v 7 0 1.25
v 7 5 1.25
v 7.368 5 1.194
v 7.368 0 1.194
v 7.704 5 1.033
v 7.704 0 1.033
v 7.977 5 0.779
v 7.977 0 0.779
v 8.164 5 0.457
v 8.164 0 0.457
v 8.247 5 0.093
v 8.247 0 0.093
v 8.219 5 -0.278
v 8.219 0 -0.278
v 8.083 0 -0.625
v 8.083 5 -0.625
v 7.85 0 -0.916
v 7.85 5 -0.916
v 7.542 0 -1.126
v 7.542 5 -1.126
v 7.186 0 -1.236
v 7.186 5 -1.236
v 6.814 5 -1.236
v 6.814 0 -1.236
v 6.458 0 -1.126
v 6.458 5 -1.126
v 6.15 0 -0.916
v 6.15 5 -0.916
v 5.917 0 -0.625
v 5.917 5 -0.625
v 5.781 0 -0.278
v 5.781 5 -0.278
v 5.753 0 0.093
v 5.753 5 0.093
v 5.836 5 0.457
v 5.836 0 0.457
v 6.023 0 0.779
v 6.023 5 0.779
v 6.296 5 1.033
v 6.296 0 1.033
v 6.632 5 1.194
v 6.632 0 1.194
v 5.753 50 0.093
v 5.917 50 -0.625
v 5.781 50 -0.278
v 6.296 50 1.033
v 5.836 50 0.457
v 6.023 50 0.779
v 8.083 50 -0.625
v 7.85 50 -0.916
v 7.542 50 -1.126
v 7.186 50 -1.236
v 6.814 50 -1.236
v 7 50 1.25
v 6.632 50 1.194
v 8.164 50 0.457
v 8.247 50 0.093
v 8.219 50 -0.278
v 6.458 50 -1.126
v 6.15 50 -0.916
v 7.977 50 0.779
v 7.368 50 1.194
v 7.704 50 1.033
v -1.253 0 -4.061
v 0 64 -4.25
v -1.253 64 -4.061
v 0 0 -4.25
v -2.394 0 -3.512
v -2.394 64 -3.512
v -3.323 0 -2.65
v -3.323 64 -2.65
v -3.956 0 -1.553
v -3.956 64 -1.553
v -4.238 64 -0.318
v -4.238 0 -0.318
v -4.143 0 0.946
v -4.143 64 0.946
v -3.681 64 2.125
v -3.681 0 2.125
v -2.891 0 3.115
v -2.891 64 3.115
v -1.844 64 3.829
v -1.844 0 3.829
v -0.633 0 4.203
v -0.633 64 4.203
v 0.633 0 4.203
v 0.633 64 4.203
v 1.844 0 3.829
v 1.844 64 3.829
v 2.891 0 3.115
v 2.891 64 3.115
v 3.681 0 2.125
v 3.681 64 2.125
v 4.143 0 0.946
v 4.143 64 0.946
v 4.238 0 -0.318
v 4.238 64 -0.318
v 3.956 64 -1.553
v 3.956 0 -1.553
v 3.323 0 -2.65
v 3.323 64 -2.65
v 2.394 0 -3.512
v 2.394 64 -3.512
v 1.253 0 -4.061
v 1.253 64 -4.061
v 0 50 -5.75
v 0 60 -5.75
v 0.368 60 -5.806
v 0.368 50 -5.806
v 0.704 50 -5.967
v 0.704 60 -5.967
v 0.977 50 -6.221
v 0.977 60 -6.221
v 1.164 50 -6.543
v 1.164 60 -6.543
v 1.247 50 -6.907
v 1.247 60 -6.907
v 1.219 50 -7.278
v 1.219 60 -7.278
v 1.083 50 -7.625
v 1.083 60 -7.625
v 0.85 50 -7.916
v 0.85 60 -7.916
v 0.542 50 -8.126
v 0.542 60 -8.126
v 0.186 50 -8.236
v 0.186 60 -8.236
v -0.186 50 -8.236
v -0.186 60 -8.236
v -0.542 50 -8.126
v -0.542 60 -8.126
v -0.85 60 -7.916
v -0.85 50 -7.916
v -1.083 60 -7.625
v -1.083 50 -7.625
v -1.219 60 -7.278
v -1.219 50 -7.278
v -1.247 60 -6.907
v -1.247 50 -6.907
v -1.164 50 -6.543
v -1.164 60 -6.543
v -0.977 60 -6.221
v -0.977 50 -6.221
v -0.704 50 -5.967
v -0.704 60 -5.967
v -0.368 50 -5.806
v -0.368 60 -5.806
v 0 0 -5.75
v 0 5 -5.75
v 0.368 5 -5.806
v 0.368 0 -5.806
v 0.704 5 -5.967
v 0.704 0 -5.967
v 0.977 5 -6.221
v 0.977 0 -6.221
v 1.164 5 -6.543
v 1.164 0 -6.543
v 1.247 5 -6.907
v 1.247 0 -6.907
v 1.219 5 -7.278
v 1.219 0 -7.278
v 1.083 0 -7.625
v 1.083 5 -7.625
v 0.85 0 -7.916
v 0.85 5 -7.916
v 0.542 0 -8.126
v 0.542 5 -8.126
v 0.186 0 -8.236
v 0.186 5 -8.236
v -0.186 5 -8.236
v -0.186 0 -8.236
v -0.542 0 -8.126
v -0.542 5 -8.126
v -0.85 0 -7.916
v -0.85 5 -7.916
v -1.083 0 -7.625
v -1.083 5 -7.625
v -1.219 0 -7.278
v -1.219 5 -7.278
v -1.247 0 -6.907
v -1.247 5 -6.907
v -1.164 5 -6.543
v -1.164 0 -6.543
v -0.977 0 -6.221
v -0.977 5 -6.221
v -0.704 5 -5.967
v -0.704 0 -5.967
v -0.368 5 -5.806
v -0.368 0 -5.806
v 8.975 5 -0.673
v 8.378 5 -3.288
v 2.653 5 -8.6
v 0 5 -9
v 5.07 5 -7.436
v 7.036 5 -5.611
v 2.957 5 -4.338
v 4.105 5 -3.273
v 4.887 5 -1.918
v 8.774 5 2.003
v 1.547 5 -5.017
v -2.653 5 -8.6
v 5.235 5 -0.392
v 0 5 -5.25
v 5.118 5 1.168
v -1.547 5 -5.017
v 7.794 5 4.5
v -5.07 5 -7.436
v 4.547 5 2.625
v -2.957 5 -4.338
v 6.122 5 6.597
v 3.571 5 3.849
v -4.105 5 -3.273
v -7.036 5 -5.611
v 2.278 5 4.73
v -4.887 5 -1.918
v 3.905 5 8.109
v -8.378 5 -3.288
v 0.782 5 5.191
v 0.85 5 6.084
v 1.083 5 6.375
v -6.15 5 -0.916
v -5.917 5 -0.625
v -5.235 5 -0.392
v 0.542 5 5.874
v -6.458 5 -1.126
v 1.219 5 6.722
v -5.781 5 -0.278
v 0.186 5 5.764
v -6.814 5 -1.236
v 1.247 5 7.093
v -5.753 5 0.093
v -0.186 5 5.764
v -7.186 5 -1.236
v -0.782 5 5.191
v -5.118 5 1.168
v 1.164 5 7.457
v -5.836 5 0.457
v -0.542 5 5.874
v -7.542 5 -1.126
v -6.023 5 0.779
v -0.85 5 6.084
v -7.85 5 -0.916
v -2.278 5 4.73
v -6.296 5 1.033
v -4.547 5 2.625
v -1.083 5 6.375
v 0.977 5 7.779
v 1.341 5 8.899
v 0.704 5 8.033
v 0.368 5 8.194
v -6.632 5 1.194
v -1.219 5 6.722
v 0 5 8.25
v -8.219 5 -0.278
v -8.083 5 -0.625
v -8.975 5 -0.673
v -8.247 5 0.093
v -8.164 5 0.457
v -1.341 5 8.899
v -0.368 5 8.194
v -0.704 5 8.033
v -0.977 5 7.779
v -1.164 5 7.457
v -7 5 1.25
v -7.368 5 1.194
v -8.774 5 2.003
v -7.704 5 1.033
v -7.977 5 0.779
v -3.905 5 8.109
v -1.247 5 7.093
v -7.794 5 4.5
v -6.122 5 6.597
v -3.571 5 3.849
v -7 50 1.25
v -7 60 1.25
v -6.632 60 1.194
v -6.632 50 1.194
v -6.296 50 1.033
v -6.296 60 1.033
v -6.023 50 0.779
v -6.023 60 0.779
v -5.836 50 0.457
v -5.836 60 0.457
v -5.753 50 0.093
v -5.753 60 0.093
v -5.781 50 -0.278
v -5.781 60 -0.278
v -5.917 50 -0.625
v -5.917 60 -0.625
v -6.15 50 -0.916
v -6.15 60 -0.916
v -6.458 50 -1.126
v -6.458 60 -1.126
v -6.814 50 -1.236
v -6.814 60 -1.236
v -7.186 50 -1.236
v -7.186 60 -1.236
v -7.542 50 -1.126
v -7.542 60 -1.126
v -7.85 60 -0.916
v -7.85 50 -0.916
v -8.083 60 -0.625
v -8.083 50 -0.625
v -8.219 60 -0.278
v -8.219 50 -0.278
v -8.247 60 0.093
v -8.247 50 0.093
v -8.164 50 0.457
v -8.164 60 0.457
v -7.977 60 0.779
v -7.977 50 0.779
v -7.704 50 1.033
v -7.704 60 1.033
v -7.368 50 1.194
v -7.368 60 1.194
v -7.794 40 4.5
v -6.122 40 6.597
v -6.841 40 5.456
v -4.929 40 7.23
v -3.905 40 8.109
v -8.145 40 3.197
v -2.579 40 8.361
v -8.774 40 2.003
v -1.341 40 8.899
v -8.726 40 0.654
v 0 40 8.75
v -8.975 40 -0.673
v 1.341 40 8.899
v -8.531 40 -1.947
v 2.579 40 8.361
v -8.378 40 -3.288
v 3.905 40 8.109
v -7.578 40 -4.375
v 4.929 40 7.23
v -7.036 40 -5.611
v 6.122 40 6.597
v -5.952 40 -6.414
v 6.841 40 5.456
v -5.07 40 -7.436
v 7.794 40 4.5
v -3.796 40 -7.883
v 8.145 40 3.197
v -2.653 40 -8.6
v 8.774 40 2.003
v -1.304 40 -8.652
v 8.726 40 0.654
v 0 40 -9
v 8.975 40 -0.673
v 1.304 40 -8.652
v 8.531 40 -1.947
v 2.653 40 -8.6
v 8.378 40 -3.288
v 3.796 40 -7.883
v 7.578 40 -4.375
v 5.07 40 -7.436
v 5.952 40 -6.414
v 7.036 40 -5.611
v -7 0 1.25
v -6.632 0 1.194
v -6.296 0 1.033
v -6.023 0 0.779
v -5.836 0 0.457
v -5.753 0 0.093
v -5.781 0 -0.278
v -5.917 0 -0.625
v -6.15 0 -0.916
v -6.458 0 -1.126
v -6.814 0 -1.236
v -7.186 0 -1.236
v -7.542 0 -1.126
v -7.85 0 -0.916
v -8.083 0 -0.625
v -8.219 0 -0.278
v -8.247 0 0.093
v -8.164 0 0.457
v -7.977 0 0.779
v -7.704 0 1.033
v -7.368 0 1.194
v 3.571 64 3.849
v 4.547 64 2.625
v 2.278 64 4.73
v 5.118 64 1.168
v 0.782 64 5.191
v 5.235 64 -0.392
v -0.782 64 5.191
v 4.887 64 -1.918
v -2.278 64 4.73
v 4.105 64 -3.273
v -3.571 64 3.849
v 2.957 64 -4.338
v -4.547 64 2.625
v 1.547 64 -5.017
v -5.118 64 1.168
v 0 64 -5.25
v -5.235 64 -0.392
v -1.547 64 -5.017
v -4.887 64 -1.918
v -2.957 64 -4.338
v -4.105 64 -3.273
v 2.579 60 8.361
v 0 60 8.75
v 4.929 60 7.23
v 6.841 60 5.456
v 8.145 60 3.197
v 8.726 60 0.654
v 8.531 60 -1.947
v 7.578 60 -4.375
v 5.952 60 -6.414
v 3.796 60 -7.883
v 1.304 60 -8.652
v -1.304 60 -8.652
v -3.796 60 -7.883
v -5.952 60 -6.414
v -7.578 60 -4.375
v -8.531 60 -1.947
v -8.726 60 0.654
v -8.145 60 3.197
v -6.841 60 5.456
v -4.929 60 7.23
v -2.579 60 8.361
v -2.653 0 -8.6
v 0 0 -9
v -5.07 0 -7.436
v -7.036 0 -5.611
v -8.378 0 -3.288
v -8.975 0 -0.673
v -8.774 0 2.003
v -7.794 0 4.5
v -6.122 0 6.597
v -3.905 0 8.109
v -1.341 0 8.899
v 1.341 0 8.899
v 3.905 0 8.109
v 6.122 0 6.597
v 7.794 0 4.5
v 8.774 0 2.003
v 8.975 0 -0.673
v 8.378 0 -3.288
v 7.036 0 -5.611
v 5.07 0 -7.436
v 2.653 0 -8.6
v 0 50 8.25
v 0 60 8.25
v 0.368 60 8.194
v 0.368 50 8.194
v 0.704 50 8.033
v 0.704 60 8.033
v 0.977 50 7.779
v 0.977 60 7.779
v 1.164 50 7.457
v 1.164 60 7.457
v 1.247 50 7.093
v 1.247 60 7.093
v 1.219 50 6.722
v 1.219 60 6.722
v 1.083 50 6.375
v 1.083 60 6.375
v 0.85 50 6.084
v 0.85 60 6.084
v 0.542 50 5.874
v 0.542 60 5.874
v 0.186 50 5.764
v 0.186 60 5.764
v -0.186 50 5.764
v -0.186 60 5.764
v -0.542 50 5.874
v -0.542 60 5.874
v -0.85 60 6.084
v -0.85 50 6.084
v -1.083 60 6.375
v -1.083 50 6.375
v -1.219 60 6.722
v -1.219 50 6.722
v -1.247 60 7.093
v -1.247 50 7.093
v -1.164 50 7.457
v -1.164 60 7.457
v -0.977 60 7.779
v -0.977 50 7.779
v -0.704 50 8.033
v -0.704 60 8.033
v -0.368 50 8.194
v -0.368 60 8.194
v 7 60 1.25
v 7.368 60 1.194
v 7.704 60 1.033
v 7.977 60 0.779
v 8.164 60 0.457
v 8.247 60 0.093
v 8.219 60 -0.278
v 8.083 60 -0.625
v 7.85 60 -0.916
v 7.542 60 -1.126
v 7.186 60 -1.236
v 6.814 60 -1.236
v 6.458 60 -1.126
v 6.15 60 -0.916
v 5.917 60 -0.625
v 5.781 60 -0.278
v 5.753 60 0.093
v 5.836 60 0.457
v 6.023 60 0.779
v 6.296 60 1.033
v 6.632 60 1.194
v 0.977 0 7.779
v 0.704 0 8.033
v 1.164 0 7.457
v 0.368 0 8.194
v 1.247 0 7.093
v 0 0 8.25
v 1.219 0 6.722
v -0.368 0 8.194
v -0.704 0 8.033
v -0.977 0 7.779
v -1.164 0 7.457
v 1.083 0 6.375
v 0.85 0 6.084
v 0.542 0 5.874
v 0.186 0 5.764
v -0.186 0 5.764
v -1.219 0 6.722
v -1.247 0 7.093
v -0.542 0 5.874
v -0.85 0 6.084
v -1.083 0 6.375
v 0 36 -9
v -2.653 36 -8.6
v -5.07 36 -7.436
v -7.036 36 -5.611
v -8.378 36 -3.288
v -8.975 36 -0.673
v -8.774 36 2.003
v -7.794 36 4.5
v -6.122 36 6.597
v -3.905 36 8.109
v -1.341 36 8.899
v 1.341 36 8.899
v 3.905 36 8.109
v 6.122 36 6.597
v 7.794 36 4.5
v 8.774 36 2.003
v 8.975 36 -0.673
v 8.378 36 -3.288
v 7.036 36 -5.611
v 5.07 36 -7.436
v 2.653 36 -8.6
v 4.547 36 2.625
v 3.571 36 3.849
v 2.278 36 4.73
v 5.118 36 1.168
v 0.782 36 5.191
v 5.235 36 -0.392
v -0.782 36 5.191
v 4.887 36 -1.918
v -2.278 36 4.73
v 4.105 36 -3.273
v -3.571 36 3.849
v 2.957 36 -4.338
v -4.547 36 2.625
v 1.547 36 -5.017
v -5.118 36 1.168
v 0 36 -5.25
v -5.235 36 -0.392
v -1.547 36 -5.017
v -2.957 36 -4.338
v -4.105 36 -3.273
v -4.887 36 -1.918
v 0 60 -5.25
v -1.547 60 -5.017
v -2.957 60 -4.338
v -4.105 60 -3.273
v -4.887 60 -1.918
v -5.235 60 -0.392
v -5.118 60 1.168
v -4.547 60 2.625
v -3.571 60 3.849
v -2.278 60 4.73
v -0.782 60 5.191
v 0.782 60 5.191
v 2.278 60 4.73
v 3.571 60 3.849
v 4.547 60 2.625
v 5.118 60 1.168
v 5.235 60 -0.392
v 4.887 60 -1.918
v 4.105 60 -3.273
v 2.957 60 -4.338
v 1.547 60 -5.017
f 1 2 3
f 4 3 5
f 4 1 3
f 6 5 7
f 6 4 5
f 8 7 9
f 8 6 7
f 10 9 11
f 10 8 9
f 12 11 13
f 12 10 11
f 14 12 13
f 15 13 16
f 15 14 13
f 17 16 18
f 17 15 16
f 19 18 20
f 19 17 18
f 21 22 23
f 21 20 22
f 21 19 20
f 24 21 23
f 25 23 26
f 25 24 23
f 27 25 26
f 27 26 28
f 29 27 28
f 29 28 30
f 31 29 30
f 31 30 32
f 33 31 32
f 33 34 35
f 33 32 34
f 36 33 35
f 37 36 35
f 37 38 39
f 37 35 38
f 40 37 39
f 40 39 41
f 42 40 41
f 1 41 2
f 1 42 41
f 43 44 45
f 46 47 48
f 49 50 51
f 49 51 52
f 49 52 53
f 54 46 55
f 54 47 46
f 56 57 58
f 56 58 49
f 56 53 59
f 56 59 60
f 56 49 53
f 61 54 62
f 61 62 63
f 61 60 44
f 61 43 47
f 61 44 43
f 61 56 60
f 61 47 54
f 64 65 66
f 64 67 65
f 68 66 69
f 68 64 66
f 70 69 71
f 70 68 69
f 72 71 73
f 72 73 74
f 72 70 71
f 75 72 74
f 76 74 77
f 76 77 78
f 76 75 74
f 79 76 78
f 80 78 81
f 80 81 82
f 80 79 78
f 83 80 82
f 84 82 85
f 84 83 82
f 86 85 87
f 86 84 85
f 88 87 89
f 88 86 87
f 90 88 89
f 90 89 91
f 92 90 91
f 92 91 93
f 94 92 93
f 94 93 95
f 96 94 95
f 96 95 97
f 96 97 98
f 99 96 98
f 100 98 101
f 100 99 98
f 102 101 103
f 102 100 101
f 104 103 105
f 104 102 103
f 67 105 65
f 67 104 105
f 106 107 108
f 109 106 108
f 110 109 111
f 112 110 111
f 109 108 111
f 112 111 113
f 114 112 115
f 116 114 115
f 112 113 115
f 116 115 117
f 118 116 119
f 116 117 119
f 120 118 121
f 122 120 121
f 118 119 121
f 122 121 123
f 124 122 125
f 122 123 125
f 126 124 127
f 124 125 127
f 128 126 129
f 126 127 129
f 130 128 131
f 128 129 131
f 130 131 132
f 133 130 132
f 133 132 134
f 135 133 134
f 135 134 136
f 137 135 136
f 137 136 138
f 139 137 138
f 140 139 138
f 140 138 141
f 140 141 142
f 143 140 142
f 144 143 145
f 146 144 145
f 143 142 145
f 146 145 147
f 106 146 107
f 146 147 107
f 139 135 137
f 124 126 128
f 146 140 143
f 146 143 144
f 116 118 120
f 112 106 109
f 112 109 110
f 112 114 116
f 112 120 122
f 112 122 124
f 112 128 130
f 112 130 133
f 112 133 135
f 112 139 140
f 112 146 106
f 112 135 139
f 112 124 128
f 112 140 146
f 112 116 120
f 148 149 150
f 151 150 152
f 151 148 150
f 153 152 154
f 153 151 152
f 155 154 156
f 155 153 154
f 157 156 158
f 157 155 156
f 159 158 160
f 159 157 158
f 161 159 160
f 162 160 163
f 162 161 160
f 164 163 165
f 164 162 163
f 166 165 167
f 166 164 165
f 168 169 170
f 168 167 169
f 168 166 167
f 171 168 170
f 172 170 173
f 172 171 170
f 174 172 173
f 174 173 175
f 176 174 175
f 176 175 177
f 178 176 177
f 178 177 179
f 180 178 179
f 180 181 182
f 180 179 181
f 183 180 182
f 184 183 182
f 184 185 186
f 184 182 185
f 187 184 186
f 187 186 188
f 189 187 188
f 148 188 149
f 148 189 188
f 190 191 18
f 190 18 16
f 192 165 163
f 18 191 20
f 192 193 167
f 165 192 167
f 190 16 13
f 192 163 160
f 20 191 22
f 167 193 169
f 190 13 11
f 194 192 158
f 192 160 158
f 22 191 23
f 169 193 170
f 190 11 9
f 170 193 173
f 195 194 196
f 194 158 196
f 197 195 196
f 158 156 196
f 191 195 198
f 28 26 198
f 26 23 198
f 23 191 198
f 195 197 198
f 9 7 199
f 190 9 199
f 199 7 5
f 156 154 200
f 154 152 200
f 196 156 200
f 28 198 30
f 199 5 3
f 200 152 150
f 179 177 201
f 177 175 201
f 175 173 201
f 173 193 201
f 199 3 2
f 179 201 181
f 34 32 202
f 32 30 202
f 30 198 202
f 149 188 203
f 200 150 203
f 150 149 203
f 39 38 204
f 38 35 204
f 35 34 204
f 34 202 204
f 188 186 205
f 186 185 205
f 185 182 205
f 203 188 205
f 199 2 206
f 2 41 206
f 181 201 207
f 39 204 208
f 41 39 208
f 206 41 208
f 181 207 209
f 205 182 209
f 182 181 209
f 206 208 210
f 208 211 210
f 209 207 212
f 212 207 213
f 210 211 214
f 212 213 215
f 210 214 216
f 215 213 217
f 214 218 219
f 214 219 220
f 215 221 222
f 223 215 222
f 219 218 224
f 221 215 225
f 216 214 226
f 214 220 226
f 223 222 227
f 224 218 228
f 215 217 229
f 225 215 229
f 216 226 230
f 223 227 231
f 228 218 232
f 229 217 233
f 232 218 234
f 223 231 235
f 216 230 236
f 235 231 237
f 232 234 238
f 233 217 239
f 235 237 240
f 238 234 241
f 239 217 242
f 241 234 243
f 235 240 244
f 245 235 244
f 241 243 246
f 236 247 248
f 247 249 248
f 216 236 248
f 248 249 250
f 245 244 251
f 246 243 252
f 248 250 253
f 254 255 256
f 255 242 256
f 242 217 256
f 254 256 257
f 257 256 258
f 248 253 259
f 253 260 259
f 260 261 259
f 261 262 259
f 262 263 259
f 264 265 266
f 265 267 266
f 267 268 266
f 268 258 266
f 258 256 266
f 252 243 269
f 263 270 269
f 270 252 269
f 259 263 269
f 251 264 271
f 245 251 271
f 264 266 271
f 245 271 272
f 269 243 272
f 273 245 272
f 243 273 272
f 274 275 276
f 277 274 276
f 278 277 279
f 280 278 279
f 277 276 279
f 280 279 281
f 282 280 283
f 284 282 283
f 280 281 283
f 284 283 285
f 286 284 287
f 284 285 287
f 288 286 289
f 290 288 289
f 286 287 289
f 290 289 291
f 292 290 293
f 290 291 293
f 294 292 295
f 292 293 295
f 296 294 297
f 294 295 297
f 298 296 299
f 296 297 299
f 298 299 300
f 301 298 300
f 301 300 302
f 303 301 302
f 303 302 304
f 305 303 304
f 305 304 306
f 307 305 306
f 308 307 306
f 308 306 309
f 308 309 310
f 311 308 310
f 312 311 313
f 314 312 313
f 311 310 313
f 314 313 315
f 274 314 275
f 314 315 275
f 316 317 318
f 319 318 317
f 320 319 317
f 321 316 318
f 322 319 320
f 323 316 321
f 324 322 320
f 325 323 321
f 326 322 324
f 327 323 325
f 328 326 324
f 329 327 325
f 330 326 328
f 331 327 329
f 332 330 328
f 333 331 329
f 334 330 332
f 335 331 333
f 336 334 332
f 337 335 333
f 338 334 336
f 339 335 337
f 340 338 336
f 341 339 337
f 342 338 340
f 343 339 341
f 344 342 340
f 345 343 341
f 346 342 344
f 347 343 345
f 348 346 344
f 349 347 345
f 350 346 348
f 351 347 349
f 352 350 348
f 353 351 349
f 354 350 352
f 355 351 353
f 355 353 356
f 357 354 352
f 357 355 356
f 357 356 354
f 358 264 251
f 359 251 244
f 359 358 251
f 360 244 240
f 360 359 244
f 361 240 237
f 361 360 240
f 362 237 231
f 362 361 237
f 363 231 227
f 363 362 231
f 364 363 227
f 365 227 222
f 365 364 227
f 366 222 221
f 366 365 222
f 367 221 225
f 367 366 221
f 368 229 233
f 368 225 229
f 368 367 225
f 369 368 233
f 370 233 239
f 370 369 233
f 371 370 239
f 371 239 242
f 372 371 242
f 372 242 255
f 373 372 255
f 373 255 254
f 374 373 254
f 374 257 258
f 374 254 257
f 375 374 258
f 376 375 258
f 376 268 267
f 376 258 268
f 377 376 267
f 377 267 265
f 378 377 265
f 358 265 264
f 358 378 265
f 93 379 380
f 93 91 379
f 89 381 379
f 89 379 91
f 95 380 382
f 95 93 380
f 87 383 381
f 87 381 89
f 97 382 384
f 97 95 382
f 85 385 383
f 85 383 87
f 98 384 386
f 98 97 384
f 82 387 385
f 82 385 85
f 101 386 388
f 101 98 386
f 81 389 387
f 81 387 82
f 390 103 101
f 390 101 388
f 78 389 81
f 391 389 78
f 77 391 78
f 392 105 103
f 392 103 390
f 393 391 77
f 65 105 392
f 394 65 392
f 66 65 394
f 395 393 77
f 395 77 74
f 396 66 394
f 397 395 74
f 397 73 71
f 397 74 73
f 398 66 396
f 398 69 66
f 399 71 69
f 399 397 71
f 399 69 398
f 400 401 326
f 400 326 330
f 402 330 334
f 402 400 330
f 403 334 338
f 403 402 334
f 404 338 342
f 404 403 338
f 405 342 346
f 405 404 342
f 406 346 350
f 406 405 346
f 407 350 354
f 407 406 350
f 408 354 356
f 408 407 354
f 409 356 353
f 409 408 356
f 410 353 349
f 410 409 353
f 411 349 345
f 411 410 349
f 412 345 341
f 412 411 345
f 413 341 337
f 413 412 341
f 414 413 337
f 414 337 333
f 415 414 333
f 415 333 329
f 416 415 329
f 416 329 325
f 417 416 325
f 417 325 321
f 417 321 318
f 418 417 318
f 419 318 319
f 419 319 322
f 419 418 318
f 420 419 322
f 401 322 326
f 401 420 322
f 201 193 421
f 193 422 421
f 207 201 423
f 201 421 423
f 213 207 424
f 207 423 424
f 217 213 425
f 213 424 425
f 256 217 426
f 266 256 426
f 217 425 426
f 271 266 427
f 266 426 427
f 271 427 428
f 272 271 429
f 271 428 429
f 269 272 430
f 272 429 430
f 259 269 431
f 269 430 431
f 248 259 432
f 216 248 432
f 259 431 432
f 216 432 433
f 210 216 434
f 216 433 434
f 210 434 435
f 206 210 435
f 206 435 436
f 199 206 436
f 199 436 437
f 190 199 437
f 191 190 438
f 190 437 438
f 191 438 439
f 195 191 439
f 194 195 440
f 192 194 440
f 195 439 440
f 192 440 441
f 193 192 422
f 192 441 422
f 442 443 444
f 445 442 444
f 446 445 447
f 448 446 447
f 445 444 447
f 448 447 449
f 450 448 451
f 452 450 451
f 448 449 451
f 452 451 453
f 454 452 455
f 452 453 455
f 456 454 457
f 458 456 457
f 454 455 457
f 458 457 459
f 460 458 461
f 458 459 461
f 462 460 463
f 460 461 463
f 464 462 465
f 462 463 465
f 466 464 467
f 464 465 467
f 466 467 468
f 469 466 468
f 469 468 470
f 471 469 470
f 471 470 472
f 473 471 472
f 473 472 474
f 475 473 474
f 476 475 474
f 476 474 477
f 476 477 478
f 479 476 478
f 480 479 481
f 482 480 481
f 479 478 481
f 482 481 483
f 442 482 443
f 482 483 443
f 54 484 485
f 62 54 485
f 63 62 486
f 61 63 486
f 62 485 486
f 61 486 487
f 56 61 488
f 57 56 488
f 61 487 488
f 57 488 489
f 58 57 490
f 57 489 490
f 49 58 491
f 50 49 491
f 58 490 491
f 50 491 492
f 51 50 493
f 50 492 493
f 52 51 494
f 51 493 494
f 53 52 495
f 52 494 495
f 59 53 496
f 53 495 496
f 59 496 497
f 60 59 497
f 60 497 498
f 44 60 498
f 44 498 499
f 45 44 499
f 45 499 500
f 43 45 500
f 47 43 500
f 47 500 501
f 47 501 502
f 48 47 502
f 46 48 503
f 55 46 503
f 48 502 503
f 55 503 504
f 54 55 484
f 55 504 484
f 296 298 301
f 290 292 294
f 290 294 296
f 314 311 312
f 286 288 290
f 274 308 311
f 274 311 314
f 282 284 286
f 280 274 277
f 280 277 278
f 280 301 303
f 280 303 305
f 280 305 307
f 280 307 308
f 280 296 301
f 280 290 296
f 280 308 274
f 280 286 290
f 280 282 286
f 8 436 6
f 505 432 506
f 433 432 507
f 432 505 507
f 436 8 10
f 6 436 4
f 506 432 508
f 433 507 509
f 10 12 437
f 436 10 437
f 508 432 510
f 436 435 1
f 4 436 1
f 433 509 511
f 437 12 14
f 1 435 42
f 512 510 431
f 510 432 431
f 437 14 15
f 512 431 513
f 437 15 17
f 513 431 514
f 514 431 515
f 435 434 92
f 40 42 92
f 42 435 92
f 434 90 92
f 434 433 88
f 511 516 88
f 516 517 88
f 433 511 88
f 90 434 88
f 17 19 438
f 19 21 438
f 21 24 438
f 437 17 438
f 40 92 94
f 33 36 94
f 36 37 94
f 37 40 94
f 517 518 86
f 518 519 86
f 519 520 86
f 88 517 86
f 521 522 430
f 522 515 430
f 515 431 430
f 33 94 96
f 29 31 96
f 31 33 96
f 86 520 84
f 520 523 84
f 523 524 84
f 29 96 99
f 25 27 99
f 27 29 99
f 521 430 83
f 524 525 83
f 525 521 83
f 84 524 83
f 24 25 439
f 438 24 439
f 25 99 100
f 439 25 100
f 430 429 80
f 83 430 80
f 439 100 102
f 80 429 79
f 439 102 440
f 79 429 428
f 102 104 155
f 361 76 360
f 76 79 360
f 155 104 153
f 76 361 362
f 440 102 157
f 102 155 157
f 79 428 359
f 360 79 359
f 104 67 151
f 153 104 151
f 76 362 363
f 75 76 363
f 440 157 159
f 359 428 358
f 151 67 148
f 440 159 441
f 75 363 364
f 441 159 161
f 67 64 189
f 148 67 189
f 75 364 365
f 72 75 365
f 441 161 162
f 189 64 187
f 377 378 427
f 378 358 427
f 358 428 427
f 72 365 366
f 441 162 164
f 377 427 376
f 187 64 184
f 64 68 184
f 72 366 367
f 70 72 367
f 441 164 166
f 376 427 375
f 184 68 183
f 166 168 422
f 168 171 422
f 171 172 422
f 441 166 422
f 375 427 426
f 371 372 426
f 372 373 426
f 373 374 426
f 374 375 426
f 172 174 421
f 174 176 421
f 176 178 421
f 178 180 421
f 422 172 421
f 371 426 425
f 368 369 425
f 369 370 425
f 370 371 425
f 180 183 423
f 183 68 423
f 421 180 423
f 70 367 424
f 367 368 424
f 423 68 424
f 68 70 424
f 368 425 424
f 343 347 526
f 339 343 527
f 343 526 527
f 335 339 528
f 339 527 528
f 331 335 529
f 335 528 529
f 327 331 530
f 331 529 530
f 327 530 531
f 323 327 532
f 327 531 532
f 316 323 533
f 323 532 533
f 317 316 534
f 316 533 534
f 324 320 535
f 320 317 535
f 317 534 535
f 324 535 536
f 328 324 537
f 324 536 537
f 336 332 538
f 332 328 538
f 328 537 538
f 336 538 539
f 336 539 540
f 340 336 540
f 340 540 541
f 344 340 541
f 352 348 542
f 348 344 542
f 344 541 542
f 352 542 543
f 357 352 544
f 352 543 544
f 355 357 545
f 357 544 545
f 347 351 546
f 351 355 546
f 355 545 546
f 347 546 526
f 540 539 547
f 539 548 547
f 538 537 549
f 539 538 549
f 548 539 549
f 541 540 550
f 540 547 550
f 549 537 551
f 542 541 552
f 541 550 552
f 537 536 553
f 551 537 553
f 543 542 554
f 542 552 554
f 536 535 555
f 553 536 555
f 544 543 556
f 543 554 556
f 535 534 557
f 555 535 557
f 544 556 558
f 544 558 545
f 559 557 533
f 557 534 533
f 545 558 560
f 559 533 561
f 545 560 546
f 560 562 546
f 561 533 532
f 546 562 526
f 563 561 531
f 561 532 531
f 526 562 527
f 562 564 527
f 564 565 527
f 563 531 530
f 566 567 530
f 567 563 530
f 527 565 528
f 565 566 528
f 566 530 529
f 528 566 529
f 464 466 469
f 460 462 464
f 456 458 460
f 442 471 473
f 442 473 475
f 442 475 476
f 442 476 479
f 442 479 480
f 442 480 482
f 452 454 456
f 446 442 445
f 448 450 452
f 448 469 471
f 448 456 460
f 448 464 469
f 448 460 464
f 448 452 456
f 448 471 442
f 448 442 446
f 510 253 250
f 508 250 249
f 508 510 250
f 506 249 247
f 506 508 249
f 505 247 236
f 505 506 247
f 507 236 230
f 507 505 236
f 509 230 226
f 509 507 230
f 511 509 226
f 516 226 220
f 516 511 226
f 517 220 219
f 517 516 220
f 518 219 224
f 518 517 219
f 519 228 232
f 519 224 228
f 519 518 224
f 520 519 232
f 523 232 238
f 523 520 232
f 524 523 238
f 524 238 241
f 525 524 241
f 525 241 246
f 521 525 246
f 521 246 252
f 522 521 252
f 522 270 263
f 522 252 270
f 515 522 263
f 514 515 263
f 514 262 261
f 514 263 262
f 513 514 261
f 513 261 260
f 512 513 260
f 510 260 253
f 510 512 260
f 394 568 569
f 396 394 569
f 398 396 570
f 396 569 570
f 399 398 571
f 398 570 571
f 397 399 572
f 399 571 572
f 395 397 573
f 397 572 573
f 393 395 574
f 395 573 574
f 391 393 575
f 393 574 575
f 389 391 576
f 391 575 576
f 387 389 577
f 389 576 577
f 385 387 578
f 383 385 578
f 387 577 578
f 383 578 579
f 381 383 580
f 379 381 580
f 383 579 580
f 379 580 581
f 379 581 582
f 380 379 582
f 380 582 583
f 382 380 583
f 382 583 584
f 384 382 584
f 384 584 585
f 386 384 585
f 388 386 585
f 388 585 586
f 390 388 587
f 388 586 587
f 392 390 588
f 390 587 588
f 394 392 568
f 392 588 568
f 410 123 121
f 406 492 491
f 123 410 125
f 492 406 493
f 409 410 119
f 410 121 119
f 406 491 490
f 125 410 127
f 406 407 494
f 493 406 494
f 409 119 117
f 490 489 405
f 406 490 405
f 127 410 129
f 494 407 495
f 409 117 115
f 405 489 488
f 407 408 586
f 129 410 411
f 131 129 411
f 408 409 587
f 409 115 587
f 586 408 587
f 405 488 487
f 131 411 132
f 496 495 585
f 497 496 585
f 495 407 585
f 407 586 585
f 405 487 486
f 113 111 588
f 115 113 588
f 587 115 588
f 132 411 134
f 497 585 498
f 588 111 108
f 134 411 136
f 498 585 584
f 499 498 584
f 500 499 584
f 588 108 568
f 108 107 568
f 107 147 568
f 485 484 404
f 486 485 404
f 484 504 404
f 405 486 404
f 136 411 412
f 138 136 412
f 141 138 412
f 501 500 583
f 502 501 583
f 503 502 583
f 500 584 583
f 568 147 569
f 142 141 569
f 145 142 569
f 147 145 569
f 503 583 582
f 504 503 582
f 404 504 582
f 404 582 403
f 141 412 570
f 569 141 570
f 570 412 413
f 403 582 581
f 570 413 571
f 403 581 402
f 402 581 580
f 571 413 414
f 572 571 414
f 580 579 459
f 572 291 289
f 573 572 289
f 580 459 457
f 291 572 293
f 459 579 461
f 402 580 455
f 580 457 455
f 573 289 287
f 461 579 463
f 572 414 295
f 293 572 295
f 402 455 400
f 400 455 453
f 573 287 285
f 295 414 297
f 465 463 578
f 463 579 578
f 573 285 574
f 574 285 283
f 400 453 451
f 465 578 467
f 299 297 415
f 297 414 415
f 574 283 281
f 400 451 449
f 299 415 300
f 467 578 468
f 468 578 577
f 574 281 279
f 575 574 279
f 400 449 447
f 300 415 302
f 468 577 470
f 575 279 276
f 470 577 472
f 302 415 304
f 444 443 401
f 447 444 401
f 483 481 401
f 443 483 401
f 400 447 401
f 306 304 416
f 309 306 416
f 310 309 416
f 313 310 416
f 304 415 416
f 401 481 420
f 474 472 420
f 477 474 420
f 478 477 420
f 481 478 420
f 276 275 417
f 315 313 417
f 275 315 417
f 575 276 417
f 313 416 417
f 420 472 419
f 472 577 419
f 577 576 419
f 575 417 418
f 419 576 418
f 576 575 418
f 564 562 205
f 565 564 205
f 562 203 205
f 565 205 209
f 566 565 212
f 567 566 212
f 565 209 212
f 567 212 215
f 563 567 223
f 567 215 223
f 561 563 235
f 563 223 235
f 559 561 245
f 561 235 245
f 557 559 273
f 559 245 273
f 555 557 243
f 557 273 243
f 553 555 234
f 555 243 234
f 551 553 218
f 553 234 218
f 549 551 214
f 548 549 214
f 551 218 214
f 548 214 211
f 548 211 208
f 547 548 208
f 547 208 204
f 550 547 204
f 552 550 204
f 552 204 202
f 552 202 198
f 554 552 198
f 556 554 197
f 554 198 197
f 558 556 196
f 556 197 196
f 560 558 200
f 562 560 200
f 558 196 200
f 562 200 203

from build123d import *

# Parameters (mm, degrees)
SKETCH_2_R          = 1.25
CUT_EXTRUDE_1_DEPTH = 10
CUT_EXTRUDE_START   = -60
SKETCH_2_2_R        = 1.25
CUT_EXTRUDE_2_DEPTH = 6
SKETCH_3_OUTSIDE_W  = 33.036
SKETCH_3_OUTSIDE_H  = 33.036
SKETCH_3_OUTSIDE_R  = 8.75
CUT_EXTRUDE_3_DEPTH = 20
SKETCH_4_R          = 5.25
SKETCH_4_R_2        = 4.25
EXTRUDE_1_DEPTH     = 4


with BuildPart() as part:
    # 草图1 → 旋转1 (revolve)
    with BuildSketch(Plane.XY, mode=Mode.PRIVATE) as revolve_1_sk:
        Polygon((-9, 36), (-5.25, 36), (-5.25, 5), (-9, 5), (-9, 0), (-4.25, 0), (-4.25, 60), (-9, 60), align=None)
    revolve(revolve_1_sk.sketch.rotate(Axis((0, 0, 0), (0, 1, 0)), 270), axis=Axis((0, 0, 0), (0, 1, 0)))

    # 草图2 → 切除-拉伸1 (cut)
    with BuildSketch(Plane(origin=(0, 60, 0), x_dir=(1, 0, 0), z_dir=(0, 1, 0))):
        with Locations(Location((0, 7, 0), (0, 0, 270))):
            Circle(SKETCH_2_R)
        with Locations(Location((0, -7, 0), (0, 0, 270))):
            Circle(SKETCH_2_R)
        with Locations(Location((-7, 0, 0), (0, 0, 270))):
            Circle(SKETCH_2_R)
        with Locations(Location((7, 0, 0), (0, 0, 270))):
            Circle(SKETCH_2_R)
    extrude(amount=-CUT_EXTRUDE_1_DEPTH, mode=Mode.SUBTRACT)

    # 草图2<2> → 切除-拉伸2 (cut)
    with BuildSketch(Plane(origin=(0, 60, 0), x_dir=(1, 0, 0), z_dir=(0, 1, 0)).offset(CUT_EXTRUDE_START)):
        with Locations(Location((0, 7, 0), (0, 0, 270))):
            Circle(SKETCH_2_2_R)
        with Locations(Location((0, -7, 0), (0, 0, 270))):
            Circle(SKETCH_2_2_R)
        with Locations(Location((-7, 0, 0), (0, 0, 270))):
            Circle(SKETCH_2_2_R)
        with Locations(Location((7, 0, 0), (0, 0, 270))):
            Circle(SKETCH_2_2_R)
    extrude(amount=CUT_EXTRUDE_2_DEPTH, mode=Mode.SUBTRACT)

    # 草图3 outside → 切除-拉伸3 (cut)
    with BuildSketch(Plane(origin=(0, 60, 0), x_dir=(1, 0, 0), z_dir=(0, 1, 0))):
        Rectangle(SKETCH_3_OUTSIDE_W, SKETCH_3_OUTSIDE_H)
        with Locations(Location((0, 0, 0), (0, 0, 270))):
            Circle(SKETCH_3_OUTSIDE_R, mode=Mode.SUBTRACT)
    extrude(amount=-CUT_EXTRUDE_3_DEPTH, mode=Mode.SUBTRACT)

    # 草图4 → 凸台-拉伸1 (add)
    with BuildSketch(Plane(origin=(0, 60, 0), x_dir=(1, 0, 0), z_dir=(0, 1, 0))):
        with Locations(Location((0, 0, 0), (0, 0, 90))):
            Circle(SKETCH_4_R)
        with Locations(Location((0, 0, 0), (0, 0, 90))):
            Circle(SKETCH_4_R_2, mode=Mode.SUBTRACT)
    extrude(amount=EXTRUDE_1_DEPTH)


solid = part.part
